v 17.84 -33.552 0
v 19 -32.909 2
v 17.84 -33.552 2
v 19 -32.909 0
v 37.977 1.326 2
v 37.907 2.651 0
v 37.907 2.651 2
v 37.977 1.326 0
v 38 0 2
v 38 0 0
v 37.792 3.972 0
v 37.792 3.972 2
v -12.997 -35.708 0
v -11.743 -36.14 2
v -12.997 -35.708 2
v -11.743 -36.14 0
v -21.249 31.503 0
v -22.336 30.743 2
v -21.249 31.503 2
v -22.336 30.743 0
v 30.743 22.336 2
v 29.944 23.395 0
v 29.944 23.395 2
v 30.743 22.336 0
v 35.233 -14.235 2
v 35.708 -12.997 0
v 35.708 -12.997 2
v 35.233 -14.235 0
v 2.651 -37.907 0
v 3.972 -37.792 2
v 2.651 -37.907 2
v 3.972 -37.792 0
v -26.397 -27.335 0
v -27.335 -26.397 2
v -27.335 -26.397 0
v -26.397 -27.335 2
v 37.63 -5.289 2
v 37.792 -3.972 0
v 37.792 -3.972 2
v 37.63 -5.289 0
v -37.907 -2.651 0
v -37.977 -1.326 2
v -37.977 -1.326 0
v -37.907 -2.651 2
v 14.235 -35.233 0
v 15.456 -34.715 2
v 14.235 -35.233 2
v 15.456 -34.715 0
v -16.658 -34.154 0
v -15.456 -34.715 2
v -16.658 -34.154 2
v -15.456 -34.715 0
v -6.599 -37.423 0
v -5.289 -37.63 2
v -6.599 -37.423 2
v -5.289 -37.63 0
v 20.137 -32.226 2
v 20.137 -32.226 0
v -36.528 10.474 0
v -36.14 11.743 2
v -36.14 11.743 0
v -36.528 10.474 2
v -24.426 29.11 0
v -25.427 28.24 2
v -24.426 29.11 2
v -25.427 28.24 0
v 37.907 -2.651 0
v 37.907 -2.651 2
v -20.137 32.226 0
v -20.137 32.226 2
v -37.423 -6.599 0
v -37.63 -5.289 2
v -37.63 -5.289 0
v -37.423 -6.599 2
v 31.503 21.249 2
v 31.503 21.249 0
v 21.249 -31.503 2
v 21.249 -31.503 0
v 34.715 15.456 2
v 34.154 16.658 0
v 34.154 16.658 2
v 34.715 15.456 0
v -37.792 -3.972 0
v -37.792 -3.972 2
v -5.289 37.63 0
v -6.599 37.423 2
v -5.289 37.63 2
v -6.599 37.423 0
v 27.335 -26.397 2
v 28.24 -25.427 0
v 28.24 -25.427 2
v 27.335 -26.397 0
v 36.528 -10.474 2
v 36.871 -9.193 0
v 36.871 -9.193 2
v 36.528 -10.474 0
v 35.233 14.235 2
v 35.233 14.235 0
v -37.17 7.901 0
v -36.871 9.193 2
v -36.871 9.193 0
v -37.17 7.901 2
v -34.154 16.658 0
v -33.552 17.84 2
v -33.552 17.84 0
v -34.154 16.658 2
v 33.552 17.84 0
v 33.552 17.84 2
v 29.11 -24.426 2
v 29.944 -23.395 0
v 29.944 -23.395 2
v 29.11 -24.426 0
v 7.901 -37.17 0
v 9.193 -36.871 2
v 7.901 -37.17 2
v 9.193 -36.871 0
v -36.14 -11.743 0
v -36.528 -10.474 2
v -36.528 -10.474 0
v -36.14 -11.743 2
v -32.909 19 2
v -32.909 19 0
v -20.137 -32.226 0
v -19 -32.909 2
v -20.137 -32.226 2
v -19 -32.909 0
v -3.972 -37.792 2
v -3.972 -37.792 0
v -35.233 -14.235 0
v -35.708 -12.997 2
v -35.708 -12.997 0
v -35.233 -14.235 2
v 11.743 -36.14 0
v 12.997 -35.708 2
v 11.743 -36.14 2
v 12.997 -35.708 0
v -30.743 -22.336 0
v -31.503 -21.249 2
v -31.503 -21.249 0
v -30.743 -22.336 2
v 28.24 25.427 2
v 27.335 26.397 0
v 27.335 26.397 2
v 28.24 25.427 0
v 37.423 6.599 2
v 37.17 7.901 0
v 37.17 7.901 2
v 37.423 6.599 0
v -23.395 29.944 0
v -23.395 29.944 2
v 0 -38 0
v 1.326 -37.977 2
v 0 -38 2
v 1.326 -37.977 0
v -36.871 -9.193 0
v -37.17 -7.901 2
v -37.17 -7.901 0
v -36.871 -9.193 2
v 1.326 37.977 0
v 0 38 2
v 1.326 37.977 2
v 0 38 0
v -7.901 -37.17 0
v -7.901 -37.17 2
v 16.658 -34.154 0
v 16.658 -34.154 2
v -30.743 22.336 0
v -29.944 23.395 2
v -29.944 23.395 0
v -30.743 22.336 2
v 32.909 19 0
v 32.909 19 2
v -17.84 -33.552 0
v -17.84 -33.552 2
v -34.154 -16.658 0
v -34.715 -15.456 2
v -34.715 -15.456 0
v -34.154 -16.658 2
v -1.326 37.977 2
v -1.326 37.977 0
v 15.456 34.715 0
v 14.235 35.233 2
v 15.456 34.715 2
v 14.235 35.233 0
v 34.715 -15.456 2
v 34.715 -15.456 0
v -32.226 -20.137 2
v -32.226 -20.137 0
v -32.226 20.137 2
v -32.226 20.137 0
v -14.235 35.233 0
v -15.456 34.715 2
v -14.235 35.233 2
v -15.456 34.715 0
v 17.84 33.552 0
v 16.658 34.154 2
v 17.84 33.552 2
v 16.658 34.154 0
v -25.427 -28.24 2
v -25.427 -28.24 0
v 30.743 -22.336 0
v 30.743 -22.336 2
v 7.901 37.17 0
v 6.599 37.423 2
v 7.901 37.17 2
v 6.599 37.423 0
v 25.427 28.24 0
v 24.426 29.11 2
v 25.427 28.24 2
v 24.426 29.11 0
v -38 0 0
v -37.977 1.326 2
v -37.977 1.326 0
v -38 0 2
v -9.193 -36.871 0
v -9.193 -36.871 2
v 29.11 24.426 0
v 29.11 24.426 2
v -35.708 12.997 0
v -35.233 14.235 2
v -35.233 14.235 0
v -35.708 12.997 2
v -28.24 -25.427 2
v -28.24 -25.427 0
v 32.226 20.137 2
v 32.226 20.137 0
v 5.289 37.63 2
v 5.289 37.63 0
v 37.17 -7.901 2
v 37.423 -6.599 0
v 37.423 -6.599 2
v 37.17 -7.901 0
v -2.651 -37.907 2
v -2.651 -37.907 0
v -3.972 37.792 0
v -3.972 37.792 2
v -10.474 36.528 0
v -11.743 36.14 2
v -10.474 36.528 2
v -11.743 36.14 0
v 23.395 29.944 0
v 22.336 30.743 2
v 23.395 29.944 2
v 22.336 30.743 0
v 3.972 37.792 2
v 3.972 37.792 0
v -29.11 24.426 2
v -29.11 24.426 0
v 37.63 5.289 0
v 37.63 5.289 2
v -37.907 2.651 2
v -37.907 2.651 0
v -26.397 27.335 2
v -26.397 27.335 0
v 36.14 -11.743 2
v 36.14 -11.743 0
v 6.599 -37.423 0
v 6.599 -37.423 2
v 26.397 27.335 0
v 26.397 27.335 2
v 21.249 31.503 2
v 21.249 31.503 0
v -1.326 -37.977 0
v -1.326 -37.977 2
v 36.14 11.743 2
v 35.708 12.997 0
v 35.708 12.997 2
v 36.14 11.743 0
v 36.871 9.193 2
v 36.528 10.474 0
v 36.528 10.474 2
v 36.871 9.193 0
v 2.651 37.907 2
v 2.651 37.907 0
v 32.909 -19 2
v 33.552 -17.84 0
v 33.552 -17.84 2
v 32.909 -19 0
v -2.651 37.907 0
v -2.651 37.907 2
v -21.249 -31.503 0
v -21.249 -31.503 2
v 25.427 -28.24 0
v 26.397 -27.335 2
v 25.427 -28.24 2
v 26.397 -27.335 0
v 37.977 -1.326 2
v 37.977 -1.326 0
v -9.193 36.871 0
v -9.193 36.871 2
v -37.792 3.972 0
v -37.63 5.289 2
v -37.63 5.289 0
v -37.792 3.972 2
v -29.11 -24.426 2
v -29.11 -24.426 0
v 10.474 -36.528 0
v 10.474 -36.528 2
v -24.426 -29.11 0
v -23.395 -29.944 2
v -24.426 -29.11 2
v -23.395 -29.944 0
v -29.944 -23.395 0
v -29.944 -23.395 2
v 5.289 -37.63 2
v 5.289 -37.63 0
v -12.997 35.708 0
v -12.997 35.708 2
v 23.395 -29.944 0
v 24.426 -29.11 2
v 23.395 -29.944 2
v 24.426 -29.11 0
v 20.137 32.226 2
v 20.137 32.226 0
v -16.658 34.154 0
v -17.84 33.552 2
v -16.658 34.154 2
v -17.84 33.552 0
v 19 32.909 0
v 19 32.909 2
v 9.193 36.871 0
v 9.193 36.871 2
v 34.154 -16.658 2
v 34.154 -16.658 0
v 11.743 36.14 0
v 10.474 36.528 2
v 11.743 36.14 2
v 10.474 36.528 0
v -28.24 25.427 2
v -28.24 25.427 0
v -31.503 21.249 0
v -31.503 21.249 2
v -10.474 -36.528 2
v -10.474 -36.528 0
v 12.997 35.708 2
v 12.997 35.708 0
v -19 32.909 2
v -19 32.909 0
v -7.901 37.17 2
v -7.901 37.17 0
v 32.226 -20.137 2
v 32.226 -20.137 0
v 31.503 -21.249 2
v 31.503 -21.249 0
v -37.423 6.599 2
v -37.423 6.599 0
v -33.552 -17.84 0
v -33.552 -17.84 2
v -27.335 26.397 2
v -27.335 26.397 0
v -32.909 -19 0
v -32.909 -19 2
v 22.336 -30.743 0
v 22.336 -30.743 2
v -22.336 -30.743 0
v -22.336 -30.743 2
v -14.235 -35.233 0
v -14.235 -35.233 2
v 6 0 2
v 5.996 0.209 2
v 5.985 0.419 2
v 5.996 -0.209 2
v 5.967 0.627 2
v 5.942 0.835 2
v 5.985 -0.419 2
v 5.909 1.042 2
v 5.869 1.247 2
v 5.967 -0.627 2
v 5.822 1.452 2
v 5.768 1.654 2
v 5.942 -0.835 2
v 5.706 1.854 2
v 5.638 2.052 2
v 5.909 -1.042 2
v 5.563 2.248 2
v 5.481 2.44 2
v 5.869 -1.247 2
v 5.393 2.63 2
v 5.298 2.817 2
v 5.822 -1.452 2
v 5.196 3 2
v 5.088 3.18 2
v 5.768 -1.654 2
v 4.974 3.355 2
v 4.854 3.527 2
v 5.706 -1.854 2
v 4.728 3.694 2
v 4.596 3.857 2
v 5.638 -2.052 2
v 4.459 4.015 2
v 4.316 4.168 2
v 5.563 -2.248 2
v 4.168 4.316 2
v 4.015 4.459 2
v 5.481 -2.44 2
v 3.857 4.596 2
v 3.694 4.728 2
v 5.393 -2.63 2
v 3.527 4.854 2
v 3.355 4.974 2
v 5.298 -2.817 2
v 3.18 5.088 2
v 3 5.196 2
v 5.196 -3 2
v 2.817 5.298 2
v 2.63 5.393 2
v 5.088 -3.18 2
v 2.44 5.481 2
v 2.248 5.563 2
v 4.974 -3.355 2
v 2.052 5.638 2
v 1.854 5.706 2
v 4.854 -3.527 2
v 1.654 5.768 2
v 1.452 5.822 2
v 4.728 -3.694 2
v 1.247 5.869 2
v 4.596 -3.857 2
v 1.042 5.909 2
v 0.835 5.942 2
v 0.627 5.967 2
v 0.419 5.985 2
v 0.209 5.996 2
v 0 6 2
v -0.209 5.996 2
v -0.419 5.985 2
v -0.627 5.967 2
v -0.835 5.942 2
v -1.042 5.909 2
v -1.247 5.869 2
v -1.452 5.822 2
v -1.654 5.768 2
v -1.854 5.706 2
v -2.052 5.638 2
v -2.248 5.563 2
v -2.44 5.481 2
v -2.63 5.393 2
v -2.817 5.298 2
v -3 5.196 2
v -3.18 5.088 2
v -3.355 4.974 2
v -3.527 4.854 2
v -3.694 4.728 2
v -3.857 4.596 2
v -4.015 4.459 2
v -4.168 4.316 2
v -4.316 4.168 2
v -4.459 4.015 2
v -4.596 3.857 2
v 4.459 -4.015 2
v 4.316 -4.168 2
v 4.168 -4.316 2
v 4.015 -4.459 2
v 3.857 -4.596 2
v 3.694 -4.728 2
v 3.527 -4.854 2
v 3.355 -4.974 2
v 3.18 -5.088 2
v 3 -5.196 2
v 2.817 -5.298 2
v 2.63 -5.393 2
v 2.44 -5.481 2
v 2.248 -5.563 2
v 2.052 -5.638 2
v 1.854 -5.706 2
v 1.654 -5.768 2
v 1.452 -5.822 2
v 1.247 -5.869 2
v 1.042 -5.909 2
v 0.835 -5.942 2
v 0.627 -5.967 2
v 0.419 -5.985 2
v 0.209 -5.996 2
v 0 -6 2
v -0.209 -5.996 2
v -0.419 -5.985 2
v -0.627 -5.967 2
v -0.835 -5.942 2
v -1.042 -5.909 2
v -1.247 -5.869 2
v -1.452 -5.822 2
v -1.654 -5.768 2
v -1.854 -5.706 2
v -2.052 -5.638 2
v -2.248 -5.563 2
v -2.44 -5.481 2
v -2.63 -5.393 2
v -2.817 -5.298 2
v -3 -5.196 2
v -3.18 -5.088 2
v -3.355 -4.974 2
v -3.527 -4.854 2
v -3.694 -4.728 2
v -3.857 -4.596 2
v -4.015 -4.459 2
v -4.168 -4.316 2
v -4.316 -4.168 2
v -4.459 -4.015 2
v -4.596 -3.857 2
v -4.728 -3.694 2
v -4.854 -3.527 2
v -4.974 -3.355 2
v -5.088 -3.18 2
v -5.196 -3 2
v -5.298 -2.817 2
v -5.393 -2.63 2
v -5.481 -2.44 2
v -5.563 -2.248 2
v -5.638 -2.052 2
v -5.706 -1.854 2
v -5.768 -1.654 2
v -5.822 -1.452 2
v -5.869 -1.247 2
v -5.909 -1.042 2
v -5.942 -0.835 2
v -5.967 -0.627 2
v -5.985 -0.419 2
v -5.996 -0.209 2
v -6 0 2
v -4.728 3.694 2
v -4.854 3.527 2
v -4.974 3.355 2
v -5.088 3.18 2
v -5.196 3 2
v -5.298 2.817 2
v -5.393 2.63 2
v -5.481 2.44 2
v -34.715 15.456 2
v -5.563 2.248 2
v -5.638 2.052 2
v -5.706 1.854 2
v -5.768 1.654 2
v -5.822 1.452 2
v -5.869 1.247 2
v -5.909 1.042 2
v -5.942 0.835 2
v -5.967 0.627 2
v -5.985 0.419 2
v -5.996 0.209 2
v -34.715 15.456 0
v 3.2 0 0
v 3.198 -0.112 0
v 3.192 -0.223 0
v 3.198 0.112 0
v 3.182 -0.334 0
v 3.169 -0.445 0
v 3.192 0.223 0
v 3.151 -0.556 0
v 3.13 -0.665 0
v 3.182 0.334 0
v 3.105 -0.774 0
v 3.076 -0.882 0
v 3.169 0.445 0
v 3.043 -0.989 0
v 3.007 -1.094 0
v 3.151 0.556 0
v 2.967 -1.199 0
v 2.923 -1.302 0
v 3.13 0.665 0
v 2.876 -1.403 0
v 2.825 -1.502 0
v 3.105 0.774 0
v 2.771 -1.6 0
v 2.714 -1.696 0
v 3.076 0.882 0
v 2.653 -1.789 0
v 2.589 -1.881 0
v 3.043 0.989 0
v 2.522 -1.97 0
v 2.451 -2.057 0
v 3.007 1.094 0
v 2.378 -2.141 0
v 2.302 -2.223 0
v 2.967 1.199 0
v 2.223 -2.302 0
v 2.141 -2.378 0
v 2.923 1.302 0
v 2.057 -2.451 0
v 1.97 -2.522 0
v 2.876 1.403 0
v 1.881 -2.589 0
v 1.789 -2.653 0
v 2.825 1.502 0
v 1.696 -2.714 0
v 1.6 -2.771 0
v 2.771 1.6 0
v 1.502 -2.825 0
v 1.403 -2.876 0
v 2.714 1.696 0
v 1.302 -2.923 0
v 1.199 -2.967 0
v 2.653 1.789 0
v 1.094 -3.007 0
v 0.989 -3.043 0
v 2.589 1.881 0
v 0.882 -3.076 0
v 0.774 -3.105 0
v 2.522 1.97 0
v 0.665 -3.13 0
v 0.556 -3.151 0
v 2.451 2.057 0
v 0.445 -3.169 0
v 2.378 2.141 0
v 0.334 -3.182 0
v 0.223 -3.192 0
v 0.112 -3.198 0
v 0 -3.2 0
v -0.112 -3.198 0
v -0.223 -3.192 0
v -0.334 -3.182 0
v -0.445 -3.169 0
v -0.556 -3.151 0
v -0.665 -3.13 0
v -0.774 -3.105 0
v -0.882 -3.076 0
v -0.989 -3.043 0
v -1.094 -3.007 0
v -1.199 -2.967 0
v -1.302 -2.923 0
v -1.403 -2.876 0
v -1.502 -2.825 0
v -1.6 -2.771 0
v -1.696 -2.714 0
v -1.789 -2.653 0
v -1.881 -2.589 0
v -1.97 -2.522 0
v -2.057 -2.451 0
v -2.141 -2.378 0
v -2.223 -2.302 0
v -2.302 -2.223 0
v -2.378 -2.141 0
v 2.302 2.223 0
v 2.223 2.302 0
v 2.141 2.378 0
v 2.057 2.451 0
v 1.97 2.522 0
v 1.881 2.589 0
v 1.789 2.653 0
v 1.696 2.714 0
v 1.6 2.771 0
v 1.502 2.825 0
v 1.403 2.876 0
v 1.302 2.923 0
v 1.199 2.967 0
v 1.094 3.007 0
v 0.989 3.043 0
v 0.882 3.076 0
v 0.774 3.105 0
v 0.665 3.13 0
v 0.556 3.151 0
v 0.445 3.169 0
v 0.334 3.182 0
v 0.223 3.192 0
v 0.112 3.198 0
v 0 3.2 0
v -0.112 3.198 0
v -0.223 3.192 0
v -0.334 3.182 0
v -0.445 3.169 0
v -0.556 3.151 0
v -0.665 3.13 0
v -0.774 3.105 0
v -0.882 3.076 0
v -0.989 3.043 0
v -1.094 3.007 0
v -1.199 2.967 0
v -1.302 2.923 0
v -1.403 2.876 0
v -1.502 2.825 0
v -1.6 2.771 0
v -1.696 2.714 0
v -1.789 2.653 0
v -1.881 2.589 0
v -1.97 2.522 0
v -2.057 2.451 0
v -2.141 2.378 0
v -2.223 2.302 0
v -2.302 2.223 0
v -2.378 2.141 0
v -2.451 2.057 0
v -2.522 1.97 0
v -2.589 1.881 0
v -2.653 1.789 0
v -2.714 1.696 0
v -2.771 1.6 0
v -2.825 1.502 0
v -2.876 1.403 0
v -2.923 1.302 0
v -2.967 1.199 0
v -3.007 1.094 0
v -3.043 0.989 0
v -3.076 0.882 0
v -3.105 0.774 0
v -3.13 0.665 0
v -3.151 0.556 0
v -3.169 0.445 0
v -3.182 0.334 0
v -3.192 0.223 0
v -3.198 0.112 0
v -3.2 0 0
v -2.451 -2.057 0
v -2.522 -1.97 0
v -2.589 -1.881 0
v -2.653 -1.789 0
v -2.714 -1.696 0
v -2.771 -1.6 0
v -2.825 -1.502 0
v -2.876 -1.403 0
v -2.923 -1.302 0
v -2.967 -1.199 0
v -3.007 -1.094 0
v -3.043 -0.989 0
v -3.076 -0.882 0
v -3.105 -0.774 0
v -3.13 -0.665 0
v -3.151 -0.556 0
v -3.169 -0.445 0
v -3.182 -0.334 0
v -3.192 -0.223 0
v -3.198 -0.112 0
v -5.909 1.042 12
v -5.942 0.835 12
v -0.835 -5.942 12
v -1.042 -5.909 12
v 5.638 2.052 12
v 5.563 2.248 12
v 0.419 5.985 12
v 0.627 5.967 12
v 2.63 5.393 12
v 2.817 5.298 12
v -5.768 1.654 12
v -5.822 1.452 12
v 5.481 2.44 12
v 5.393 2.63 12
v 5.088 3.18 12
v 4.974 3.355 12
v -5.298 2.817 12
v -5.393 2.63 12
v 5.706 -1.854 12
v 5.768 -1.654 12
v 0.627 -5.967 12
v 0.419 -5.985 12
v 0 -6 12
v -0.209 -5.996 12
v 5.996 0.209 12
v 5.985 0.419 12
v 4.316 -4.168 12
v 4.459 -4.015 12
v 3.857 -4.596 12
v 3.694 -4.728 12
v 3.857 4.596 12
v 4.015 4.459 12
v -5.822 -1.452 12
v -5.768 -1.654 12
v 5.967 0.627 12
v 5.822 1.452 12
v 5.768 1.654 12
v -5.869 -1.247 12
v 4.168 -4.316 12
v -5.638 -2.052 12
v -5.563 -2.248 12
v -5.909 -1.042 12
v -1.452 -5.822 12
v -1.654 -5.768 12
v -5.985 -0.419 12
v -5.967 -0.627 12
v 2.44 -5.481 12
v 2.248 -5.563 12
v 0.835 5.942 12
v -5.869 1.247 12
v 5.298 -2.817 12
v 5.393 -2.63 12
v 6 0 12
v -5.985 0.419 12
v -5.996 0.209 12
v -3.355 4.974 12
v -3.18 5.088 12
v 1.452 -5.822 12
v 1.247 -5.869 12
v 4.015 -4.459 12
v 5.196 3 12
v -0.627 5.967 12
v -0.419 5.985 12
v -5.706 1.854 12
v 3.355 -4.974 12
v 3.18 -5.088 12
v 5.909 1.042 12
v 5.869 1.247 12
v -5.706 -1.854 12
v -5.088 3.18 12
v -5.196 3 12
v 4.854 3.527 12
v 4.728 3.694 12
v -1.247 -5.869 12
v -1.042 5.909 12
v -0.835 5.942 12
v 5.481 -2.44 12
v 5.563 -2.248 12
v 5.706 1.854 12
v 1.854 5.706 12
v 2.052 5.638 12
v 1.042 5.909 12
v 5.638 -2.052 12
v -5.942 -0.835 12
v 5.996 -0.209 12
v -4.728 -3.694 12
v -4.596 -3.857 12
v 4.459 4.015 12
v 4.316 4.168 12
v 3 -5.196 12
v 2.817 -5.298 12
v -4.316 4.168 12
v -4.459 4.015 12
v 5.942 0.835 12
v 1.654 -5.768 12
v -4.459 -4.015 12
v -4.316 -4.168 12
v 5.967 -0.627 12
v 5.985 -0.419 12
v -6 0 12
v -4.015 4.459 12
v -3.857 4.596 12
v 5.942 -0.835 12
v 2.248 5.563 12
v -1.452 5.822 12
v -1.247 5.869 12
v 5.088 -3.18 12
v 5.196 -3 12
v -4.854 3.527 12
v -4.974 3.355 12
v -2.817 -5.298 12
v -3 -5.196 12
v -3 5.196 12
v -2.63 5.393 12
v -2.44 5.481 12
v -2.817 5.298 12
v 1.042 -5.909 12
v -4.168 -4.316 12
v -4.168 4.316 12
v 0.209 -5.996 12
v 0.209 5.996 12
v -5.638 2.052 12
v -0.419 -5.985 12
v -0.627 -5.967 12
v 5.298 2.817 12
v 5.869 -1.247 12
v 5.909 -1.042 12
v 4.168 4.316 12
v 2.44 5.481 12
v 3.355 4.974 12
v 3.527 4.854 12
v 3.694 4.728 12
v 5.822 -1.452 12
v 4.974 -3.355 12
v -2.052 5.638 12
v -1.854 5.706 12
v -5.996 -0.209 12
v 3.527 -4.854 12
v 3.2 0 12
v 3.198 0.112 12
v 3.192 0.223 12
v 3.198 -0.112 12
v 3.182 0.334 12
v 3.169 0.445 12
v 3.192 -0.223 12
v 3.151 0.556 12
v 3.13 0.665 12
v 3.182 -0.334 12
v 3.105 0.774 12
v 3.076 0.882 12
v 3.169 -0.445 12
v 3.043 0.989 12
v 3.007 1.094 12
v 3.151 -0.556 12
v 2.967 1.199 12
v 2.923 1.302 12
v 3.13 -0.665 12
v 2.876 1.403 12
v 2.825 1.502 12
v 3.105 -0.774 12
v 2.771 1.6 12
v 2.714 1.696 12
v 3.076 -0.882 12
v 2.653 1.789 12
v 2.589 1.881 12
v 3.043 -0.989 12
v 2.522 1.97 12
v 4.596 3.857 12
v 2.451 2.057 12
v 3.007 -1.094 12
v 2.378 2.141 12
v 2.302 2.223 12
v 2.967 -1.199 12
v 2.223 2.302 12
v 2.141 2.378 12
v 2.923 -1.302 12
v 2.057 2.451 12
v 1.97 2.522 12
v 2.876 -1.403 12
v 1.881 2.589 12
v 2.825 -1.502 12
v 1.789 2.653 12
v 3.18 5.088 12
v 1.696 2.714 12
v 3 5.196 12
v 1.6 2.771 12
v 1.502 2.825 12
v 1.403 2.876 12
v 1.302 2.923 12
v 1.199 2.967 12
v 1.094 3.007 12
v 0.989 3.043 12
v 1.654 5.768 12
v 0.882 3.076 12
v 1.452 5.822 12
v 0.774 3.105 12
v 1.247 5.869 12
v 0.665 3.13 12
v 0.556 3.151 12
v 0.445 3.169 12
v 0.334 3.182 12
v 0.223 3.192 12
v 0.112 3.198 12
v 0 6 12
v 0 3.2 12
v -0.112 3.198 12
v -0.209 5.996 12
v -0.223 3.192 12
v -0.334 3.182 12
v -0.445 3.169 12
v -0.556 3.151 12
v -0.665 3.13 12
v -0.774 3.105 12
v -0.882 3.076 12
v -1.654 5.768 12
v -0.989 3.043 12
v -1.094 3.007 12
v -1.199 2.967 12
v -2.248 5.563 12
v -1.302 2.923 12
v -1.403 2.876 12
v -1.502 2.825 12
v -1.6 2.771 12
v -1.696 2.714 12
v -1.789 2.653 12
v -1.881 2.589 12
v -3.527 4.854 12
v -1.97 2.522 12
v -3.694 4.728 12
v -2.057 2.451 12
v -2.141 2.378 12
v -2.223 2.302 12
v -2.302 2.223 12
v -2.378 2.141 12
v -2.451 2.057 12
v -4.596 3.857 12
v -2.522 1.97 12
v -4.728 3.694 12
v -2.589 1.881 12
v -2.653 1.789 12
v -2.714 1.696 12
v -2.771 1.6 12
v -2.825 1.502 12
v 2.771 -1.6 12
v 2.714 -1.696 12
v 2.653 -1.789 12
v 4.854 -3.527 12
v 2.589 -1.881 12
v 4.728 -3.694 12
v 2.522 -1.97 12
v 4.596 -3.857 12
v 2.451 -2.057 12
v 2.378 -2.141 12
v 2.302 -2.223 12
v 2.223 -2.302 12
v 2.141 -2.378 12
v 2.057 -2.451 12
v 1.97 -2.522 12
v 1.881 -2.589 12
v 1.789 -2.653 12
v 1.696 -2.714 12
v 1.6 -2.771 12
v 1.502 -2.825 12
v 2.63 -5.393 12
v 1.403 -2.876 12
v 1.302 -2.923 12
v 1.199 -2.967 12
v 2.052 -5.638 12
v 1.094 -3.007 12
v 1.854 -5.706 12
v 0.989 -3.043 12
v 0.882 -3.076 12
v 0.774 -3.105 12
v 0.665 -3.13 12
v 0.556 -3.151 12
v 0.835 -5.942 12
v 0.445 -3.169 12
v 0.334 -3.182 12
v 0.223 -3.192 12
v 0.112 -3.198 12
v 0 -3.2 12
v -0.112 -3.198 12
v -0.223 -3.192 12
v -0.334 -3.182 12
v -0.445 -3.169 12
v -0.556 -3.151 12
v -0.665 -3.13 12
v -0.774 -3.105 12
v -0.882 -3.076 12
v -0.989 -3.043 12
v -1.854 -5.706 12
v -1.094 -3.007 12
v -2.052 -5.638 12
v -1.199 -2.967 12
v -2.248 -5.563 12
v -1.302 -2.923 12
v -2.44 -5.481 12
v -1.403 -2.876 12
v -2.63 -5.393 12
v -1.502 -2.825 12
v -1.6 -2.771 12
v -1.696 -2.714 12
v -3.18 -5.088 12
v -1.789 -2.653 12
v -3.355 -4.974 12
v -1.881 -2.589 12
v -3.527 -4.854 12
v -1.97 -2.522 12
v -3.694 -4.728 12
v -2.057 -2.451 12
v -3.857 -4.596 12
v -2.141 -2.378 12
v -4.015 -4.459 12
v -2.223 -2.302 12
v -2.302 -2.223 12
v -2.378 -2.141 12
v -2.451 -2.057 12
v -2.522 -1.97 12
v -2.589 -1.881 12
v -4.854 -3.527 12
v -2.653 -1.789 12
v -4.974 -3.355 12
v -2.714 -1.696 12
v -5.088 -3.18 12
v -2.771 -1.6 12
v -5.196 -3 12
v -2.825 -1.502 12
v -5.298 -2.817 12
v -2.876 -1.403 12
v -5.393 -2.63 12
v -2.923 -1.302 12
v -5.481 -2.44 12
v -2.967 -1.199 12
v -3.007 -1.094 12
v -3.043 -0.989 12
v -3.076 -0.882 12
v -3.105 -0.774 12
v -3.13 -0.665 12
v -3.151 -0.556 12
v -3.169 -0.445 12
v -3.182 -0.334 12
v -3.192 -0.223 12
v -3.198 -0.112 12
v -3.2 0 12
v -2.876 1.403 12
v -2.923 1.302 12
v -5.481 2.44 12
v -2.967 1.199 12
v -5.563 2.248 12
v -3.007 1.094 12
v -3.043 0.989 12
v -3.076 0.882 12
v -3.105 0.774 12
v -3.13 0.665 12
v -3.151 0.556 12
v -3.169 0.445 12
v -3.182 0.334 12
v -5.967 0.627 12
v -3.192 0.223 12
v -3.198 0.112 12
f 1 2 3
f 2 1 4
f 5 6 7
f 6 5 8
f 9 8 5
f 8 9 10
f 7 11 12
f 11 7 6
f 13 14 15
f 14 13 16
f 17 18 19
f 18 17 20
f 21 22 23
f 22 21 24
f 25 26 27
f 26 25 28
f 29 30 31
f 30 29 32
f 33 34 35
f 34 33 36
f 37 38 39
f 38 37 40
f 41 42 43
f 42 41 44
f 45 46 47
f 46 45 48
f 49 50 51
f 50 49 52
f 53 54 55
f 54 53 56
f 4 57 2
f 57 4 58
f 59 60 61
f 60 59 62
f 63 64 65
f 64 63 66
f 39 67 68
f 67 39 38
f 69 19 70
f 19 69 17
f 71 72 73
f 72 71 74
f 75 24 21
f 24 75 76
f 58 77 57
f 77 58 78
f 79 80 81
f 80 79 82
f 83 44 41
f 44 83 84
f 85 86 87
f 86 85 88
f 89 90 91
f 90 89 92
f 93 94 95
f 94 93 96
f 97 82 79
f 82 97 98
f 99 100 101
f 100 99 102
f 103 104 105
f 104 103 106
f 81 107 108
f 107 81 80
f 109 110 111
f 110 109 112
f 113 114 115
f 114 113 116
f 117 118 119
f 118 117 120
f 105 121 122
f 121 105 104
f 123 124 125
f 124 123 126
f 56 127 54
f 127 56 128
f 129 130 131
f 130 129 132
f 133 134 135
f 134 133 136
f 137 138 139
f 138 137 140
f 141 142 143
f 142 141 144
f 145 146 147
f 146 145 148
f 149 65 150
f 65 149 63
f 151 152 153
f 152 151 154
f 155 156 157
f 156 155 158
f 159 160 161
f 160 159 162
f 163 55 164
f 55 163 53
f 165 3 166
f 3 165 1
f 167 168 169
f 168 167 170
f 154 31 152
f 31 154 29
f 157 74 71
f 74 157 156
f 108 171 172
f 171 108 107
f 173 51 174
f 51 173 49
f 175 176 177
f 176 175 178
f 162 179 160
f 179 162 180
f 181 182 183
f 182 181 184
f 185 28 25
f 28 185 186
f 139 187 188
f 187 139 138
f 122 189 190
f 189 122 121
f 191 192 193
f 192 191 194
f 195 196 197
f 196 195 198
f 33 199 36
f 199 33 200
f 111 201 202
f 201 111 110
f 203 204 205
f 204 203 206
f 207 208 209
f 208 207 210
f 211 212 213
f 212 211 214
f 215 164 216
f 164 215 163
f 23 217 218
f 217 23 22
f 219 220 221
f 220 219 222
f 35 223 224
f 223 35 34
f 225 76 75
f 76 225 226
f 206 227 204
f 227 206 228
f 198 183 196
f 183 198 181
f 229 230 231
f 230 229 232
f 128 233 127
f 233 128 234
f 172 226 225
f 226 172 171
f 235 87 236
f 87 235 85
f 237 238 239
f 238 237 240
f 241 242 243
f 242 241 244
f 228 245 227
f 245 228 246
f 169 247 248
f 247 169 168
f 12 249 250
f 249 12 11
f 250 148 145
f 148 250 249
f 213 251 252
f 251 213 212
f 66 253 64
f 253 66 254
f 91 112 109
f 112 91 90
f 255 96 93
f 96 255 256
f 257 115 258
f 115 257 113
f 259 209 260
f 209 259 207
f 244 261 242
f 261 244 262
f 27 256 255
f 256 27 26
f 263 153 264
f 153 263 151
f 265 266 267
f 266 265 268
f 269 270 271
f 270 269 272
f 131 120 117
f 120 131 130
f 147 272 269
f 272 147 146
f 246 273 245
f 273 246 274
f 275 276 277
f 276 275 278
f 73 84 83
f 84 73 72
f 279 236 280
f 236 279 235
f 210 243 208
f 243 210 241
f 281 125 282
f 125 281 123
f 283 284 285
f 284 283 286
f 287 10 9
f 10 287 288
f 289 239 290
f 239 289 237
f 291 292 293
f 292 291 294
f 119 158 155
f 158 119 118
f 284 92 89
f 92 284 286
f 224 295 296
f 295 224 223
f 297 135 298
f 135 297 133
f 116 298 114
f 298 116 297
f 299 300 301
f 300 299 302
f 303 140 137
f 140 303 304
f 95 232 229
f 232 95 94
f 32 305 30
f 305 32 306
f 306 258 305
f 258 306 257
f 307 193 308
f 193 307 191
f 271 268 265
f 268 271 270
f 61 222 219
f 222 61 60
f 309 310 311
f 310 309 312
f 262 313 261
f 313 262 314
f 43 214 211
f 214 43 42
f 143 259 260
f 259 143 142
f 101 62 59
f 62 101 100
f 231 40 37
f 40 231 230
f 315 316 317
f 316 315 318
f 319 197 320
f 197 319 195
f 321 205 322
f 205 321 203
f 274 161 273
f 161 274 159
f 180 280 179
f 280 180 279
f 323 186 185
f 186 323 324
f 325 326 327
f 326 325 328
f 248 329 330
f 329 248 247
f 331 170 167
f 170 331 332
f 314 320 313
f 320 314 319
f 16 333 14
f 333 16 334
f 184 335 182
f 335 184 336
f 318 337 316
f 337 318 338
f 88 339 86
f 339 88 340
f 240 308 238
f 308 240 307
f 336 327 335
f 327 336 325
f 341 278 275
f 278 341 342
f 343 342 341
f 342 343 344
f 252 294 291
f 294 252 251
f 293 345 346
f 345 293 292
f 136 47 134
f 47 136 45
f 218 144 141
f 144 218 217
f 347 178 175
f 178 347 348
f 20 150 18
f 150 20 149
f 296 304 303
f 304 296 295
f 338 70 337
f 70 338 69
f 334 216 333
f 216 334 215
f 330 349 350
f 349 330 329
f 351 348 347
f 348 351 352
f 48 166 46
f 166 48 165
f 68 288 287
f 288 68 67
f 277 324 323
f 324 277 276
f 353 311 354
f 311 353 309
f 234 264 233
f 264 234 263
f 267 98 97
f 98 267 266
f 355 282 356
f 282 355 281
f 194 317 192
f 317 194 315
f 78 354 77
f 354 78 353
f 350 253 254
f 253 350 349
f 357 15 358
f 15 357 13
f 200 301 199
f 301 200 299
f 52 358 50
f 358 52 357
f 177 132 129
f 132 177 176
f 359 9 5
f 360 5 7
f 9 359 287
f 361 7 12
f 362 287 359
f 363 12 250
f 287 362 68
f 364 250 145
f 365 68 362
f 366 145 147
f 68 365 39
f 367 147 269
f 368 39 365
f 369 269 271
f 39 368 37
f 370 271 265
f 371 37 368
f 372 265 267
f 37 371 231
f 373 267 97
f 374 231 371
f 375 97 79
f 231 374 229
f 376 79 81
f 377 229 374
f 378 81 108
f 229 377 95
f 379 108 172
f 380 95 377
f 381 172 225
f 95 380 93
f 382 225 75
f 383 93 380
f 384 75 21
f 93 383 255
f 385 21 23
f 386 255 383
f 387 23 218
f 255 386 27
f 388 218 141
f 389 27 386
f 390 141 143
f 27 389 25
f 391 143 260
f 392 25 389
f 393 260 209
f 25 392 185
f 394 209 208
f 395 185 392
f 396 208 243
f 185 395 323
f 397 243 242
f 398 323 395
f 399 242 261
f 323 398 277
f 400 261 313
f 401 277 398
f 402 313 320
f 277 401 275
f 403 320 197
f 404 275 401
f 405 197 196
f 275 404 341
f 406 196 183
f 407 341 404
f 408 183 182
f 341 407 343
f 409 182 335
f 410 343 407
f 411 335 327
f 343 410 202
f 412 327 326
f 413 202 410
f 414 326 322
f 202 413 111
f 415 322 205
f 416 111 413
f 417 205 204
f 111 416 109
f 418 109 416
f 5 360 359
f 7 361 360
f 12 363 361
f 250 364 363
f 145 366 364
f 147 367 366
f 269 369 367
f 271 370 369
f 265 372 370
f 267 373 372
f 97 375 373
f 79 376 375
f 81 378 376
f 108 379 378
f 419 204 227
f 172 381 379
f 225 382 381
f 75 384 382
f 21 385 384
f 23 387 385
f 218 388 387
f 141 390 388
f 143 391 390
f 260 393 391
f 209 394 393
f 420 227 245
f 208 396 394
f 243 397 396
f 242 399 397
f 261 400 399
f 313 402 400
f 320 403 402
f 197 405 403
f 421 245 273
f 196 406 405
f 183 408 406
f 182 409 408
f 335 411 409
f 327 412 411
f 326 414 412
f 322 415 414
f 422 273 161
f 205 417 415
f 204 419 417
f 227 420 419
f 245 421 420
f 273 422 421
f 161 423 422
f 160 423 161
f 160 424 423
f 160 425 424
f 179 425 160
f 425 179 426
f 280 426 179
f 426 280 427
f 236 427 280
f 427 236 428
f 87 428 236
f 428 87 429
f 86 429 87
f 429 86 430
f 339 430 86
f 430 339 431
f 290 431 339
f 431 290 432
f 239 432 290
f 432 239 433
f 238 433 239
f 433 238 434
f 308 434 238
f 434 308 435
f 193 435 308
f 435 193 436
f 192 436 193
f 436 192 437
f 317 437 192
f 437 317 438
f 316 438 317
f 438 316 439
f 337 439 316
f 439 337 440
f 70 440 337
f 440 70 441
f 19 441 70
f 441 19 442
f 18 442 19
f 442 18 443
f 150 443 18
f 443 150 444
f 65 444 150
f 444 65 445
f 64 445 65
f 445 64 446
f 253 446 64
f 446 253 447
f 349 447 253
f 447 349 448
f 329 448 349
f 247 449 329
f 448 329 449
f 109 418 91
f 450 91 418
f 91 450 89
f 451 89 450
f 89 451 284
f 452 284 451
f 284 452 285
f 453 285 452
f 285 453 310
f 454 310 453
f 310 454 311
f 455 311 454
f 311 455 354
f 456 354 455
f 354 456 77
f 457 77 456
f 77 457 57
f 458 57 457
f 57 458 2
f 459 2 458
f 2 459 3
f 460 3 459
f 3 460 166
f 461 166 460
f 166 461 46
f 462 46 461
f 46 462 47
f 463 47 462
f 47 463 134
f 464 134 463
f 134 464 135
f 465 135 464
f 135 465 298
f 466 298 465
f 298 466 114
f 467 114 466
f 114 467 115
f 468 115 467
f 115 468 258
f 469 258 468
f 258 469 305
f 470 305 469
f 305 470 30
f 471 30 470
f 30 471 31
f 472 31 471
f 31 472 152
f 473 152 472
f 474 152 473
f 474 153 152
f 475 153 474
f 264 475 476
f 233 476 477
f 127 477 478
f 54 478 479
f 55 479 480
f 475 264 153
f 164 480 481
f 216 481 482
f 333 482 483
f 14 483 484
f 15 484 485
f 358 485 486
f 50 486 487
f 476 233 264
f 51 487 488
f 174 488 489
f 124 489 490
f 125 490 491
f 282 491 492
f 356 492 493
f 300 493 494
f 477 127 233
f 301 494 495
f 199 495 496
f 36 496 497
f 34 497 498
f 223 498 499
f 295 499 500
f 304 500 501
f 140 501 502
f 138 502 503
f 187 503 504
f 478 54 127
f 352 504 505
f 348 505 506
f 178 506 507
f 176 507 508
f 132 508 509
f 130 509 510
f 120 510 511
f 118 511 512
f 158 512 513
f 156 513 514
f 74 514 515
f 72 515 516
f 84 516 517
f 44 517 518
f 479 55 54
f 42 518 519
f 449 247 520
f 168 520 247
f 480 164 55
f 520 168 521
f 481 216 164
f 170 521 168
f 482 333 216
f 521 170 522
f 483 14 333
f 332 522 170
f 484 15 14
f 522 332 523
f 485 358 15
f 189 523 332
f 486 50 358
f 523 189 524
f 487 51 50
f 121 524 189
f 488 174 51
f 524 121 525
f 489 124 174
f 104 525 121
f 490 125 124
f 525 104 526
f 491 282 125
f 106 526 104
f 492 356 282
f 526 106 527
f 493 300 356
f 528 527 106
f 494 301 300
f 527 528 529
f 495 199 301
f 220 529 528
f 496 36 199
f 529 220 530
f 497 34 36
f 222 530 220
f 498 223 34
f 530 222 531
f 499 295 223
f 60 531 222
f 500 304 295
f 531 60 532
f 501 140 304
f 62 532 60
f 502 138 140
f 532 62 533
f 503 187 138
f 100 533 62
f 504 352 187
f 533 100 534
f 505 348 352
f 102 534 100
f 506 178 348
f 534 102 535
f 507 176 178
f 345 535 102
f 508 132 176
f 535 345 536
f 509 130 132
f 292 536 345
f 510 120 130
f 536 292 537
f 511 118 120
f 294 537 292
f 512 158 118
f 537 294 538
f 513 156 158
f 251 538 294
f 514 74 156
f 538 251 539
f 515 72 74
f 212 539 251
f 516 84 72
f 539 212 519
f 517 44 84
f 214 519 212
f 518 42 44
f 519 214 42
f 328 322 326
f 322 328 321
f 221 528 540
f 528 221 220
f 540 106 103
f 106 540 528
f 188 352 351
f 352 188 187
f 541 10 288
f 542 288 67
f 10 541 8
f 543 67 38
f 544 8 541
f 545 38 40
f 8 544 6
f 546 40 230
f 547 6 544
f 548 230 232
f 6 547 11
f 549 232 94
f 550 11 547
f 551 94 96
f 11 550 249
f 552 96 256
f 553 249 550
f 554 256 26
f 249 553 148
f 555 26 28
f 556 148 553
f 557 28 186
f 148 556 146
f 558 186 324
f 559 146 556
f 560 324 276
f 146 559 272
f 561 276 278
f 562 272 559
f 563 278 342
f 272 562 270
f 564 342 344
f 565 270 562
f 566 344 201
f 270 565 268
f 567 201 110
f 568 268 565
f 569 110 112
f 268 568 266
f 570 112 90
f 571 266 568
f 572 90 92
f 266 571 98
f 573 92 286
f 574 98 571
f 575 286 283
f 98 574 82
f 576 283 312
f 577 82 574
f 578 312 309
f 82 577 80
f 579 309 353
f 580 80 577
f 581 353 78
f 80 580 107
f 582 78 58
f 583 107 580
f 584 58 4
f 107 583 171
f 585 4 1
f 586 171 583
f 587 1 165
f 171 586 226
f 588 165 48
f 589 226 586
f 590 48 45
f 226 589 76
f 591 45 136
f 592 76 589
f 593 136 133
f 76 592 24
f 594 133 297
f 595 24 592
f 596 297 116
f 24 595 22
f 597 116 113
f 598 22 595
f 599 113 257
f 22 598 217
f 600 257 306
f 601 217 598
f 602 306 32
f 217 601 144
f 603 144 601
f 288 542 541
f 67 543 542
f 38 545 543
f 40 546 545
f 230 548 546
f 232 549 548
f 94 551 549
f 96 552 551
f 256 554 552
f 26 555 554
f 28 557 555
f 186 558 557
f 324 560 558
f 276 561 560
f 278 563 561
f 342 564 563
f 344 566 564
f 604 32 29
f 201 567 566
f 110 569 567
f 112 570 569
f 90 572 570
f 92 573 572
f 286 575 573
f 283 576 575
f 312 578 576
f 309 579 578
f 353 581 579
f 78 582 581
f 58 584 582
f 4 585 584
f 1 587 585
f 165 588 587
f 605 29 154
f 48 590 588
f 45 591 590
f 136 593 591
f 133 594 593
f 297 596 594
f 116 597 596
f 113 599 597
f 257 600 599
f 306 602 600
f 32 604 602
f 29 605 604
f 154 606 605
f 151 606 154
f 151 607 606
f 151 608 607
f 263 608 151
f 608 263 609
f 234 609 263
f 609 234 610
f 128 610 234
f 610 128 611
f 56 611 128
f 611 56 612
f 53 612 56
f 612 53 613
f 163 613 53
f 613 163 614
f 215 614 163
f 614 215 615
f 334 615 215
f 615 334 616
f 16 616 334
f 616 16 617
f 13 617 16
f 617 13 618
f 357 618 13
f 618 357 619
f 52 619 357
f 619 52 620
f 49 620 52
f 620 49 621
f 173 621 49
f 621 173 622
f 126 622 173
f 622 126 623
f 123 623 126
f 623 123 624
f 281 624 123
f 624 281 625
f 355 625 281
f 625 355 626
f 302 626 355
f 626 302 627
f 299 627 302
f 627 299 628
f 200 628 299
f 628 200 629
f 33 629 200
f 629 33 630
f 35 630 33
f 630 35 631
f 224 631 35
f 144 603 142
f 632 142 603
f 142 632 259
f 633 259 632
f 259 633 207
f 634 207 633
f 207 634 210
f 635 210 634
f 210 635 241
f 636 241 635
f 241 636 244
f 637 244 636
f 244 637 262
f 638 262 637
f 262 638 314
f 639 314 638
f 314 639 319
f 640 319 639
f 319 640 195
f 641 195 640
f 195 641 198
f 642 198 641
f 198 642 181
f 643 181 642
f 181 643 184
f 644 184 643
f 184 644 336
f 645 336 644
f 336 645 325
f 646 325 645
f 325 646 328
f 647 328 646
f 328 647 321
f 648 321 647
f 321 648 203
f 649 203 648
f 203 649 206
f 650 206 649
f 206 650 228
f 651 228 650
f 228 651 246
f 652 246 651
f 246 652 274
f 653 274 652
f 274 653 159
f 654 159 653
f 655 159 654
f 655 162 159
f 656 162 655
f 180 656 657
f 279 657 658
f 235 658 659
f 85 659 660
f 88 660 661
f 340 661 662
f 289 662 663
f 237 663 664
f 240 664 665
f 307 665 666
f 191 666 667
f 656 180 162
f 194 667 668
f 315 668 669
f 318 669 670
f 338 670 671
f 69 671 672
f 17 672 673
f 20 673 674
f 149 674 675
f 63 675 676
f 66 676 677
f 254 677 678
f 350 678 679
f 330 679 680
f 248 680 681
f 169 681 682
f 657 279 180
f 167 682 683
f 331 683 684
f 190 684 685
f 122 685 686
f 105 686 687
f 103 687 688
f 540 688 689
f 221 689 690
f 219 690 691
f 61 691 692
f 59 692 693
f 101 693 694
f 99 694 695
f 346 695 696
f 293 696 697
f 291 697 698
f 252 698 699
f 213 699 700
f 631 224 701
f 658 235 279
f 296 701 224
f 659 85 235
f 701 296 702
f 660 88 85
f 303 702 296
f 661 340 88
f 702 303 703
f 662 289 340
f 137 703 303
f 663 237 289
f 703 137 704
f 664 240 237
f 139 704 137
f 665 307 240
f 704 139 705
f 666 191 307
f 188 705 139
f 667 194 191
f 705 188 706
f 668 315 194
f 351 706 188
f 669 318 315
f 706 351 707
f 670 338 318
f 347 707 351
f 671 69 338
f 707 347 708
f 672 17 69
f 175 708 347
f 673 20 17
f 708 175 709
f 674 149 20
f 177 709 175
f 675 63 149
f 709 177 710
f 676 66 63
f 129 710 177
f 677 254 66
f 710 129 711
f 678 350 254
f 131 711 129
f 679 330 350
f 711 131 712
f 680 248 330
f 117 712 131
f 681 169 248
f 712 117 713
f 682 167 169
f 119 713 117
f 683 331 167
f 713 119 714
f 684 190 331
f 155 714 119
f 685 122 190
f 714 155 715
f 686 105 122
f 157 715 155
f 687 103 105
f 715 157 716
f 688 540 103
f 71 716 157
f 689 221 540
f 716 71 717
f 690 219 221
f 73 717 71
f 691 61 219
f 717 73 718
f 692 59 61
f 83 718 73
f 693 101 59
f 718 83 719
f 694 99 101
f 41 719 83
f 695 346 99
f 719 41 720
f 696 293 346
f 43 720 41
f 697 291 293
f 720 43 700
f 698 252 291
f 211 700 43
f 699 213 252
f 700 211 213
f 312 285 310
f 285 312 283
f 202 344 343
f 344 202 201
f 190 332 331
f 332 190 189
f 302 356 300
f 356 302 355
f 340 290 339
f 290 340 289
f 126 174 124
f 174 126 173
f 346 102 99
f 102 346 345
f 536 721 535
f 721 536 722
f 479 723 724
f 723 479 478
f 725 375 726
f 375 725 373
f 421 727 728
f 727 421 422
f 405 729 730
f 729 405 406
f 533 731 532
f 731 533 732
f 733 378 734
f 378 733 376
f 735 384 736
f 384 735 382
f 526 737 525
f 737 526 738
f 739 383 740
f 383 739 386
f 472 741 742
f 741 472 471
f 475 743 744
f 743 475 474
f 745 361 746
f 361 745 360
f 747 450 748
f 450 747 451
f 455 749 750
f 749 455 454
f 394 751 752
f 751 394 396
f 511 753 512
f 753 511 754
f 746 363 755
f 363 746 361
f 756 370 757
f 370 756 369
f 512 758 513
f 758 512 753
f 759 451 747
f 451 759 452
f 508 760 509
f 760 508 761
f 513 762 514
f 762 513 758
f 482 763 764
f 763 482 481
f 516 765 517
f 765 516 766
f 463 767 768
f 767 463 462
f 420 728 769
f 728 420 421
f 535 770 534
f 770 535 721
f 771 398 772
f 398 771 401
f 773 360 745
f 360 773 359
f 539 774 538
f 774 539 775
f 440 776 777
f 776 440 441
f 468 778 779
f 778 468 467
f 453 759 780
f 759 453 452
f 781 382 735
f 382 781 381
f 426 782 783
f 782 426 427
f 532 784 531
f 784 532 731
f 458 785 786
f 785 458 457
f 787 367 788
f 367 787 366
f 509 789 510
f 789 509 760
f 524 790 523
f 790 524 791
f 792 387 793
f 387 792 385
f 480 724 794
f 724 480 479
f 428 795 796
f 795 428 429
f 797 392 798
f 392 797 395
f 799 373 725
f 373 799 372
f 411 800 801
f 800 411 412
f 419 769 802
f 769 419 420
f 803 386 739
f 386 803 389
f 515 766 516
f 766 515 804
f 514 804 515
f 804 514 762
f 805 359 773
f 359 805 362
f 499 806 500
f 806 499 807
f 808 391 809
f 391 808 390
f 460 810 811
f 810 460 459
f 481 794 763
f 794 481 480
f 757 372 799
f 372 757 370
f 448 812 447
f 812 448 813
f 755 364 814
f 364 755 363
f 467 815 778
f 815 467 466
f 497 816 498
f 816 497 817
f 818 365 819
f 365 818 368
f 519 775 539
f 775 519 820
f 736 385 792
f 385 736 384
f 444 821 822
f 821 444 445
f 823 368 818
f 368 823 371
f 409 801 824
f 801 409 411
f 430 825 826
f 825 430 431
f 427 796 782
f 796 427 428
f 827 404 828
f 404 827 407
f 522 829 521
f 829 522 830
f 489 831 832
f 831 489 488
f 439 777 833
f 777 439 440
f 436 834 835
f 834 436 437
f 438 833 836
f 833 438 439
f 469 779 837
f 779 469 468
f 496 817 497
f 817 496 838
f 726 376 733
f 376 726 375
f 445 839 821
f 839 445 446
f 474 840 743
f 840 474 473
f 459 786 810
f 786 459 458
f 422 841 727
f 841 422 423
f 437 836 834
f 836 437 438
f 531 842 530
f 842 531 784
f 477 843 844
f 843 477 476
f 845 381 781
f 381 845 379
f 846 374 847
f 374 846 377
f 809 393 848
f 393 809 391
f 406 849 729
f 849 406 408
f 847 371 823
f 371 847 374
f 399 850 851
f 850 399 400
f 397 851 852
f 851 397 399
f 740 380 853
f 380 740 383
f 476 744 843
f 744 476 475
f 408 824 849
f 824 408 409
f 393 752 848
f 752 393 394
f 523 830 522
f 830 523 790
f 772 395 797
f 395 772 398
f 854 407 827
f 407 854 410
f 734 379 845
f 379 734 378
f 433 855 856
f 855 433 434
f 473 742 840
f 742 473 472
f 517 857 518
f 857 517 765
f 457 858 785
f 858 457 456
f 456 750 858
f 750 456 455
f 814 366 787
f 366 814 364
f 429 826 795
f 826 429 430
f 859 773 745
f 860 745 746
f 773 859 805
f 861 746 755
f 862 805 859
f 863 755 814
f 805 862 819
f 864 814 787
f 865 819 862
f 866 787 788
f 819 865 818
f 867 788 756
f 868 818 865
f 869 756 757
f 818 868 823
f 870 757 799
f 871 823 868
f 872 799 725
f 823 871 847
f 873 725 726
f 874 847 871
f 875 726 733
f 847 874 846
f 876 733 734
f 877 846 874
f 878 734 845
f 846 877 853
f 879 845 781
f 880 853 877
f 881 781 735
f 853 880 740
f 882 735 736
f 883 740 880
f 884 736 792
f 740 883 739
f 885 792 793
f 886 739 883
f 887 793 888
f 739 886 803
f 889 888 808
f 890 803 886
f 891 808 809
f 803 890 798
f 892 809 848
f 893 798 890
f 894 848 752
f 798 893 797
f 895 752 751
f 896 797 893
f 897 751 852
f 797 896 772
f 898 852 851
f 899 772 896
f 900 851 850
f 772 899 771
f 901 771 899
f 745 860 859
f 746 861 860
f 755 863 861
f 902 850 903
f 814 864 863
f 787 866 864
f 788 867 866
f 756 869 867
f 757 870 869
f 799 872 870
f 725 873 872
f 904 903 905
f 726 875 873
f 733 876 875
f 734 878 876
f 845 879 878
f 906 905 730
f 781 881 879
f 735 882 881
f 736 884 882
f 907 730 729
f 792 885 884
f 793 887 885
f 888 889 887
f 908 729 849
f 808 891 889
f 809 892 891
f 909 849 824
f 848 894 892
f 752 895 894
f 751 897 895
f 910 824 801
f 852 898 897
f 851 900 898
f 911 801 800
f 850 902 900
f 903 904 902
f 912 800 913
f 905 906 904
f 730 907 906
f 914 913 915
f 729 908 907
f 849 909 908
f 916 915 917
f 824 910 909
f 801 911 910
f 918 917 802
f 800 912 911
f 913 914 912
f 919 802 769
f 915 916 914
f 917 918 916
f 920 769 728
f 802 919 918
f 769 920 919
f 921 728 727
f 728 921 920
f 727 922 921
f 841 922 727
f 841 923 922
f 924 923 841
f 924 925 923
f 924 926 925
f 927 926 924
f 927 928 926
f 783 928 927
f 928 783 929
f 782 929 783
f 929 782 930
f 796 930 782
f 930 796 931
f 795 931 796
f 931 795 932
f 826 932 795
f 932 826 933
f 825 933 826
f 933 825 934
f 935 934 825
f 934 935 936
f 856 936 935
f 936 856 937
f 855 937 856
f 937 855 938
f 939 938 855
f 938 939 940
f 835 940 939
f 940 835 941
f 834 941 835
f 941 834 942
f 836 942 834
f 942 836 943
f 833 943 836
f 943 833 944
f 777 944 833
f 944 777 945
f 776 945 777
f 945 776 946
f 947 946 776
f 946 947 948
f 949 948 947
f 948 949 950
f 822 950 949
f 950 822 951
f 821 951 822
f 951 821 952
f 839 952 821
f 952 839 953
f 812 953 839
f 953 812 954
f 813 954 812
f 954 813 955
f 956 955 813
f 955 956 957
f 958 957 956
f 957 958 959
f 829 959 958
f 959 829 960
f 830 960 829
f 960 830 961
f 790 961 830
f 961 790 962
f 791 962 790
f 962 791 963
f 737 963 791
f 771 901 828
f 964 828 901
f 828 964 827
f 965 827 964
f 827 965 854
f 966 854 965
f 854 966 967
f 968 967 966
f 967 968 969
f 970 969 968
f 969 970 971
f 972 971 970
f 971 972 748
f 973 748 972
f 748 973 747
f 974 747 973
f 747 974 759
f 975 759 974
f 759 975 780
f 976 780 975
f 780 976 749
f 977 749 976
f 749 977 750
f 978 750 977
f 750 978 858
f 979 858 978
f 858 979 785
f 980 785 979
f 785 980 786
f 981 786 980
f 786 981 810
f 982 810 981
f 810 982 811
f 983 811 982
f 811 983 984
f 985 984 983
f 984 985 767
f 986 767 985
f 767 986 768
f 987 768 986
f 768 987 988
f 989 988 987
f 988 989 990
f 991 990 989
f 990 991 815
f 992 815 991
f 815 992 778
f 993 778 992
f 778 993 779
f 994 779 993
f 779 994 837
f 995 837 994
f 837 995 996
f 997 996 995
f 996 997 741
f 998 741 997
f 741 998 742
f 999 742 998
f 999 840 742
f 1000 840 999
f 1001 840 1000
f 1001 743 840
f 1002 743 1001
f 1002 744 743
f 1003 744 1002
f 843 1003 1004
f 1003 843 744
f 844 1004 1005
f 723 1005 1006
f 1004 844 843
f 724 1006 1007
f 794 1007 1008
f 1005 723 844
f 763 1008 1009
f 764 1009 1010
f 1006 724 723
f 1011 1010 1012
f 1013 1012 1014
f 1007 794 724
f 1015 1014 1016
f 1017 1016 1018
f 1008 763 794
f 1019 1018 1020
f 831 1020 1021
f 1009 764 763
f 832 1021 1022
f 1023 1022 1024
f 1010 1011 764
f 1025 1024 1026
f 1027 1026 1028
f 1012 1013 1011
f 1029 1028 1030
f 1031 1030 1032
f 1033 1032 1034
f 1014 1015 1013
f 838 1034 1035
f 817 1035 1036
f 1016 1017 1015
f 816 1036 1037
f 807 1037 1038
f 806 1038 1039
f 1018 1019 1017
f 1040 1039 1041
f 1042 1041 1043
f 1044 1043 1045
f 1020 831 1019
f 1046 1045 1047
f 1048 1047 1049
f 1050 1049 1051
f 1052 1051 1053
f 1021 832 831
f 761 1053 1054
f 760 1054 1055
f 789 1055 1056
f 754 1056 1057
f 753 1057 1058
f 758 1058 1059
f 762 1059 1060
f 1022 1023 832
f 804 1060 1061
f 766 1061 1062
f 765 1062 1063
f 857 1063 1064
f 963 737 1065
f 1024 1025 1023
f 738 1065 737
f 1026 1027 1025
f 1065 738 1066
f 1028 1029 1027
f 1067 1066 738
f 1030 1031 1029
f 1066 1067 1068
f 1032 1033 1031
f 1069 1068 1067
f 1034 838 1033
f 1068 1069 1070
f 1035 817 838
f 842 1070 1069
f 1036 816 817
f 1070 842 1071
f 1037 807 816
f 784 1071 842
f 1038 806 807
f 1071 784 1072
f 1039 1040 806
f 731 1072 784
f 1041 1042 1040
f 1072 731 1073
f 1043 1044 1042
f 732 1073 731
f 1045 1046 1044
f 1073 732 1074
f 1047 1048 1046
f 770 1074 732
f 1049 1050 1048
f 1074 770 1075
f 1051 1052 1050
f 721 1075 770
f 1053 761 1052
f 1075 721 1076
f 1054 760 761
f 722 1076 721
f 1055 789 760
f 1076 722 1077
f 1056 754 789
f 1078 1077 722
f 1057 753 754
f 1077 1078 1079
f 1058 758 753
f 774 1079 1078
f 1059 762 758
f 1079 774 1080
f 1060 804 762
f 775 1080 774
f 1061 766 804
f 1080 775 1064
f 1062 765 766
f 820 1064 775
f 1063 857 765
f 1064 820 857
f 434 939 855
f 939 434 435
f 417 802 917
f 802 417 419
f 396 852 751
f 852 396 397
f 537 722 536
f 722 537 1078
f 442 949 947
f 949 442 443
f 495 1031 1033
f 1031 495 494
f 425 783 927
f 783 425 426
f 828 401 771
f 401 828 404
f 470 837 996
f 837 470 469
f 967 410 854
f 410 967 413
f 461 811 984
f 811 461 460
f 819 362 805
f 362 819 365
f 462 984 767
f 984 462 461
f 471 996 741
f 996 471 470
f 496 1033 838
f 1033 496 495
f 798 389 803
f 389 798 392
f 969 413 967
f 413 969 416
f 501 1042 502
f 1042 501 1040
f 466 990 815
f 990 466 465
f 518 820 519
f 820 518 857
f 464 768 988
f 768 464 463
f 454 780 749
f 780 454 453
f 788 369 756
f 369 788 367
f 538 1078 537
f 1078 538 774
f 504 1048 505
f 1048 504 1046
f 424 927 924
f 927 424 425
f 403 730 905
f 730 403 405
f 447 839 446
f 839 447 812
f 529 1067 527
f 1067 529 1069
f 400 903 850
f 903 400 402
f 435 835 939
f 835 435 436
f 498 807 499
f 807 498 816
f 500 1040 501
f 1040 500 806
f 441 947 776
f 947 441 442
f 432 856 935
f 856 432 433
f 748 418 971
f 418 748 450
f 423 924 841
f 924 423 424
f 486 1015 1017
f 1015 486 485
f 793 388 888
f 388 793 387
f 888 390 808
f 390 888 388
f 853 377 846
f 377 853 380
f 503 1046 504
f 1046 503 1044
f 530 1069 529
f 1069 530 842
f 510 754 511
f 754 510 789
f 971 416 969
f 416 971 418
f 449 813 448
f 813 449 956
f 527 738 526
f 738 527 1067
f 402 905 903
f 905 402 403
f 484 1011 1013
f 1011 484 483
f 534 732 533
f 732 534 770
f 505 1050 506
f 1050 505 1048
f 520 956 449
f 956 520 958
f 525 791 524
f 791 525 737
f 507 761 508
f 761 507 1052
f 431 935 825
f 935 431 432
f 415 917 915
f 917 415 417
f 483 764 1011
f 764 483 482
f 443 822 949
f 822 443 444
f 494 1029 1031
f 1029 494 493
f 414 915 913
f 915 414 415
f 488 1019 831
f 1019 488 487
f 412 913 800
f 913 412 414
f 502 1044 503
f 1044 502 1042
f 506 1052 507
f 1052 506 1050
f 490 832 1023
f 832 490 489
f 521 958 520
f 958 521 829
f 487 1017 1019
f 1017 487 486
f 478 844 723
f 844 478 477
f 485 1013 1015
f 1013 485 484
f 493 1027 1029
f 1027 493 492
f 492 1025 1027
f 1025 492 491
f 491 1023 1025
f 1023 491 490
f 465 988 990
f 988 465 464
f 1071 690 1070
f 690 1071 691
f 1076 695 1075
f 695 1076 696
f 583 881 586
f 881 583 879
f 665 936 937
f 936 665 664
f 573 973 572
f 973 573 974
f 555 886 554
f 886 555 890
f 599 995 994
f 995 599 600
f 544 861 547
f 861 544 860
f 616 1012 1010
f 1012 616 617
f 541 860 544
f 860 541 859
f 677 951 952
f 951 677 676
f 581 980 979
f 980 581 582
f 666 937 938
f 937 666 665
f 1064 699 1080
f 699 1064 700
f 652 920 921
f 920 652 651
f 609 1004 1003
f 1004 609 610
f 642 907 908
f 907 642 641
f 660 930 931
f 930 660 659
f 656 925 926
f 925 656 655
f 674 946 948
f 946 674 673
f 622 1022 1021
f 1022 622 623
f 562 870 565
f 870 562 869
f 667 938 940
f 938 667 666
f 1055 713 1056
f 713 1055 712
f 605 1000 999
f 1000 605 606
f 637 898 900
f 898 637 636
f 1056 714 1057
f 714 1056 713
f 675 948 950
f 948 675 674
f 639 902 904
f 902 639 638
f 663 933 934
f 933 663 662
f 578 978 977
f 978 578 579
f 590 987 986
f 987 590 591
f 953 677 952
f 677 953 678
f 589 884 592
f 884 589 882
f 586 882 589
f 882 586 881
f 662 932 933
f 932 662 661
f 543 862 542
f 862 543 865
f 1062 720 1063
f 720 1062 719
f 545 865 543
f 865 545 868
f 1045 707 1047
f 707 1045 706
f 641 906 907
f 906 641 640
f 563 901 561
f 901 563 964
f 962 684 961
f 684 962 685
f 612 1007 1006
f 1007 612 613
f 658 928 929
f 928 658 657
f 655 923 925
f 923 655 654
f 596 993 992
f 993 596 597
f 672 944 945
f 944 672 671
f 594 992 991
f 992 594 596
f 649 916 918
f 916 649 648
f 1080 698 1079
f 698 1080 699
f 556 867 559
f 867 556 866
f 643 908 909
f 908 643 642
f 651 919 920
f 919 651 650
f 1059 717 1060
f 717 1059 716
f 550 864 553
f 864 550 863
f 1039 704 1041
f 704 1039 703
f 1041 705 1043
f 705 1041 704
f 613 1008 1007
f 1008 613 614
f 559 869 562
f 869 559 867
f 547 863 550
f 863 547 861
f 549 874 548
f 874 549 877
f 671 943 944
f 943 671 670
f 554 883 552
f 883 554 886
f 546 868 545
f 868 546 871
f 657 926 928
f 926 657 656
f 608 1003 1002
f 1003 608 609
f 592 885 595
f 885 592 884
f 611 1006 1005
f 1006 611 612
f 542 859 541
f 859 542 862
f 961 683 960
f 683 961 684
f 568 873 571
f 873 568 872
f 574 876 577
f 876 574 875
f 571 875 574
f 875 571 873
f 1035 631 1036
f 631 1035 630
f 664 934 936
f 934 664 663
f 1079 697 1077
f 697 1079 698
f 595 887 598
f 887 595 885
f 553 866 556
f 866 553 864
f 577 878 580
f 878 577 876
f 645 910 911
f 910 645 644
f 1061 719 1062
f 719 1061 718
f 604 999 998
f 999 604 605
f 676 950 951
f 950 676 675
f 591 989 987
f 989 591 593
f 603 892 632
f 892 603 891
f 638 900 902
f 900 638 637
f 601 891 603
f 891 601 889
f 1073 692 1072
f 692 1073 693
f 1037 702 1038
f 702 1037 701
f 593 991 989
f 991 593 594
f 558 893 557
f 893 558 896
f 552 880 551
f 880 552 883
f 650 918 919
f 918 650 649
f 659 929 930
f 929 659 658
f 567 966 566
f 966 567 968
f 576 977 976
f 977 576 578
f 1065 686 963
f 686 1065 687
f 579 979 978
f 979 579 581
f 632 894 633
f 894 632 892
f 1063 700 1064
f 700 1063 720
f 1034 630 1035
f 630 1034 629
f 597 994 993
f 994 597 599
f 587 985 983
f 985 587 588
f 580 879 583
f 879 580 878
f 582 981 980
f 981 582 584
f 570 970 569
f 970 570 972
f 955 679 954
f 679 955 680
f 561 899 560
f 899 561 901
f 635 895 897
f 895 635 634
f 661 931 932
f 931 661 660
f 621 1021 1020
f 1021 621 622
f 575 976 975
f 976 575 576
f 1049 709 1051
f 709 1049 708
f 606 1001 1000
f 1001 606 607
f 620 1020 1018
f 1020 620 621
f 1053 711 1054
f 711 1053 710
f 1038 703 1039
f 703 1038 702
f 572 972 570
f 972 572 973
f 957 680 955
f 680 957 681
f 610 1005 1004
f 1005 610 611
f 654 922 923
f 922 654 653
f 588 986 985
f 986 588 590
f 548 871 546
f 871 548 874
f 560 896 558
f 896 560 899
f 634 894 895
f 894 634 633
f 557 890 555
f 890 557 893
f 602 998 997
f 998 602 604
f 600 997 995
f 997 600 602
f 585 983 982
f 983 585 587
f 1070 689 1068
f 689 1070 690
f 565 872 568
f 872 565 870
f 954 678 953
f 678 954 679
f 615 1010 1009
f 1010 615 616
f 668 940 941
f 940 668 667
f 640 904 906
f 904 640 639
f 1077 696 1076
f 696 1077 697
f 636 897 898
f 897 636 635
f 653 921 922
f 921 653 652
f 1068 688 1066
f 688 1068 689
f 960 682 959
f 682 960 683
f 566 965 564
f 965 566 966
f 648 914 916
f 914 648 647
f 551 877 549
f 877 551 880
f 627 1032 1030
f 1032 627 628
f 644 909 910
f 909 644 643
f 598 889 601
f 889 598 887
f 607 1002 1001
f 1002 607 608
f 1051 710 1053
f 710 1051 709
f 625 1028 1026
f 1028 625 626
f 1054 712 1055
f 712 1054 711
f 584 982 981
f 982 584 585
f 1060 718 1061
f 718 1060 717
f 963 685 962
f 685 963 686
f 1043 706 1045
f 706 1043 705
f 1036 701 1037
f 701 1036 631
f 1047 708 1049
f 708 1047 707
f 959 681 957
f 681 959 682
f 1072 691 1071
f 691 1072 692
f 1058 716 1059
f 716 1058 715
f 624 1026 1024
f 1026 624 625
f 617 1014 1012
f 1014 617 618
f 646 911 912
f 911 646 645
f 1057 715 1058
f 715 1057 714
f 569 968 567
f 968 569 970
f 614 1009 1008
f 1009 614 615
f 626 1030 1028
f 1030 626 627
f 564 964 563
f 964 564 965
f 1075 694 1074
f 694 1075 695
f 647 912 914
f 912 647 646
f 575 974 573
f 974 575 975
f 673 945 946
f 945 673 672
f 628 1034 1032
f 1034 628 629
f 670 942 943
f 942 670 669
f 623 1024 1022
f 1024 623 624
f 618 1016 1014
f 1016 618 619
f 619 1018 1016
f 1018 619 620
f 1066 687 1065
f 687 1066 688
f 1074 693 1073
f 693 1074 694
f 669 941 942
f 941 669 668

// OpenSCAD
$fn=180;

guide_thickness = 12;
thickness = 2;
radius = 38;
hole_radius = 3.2;
guide_radius = 6;

difference(){
    union(){
        //main
        cylinder(h=thickness, r=radius);

        //guide
        cylinder(h=guide_thickness, r=guide_radius);
    }
    //hole
    translate([0,0,-1])
    cylinder(h=guide_thickness+2, r=hole_radius);    
}
